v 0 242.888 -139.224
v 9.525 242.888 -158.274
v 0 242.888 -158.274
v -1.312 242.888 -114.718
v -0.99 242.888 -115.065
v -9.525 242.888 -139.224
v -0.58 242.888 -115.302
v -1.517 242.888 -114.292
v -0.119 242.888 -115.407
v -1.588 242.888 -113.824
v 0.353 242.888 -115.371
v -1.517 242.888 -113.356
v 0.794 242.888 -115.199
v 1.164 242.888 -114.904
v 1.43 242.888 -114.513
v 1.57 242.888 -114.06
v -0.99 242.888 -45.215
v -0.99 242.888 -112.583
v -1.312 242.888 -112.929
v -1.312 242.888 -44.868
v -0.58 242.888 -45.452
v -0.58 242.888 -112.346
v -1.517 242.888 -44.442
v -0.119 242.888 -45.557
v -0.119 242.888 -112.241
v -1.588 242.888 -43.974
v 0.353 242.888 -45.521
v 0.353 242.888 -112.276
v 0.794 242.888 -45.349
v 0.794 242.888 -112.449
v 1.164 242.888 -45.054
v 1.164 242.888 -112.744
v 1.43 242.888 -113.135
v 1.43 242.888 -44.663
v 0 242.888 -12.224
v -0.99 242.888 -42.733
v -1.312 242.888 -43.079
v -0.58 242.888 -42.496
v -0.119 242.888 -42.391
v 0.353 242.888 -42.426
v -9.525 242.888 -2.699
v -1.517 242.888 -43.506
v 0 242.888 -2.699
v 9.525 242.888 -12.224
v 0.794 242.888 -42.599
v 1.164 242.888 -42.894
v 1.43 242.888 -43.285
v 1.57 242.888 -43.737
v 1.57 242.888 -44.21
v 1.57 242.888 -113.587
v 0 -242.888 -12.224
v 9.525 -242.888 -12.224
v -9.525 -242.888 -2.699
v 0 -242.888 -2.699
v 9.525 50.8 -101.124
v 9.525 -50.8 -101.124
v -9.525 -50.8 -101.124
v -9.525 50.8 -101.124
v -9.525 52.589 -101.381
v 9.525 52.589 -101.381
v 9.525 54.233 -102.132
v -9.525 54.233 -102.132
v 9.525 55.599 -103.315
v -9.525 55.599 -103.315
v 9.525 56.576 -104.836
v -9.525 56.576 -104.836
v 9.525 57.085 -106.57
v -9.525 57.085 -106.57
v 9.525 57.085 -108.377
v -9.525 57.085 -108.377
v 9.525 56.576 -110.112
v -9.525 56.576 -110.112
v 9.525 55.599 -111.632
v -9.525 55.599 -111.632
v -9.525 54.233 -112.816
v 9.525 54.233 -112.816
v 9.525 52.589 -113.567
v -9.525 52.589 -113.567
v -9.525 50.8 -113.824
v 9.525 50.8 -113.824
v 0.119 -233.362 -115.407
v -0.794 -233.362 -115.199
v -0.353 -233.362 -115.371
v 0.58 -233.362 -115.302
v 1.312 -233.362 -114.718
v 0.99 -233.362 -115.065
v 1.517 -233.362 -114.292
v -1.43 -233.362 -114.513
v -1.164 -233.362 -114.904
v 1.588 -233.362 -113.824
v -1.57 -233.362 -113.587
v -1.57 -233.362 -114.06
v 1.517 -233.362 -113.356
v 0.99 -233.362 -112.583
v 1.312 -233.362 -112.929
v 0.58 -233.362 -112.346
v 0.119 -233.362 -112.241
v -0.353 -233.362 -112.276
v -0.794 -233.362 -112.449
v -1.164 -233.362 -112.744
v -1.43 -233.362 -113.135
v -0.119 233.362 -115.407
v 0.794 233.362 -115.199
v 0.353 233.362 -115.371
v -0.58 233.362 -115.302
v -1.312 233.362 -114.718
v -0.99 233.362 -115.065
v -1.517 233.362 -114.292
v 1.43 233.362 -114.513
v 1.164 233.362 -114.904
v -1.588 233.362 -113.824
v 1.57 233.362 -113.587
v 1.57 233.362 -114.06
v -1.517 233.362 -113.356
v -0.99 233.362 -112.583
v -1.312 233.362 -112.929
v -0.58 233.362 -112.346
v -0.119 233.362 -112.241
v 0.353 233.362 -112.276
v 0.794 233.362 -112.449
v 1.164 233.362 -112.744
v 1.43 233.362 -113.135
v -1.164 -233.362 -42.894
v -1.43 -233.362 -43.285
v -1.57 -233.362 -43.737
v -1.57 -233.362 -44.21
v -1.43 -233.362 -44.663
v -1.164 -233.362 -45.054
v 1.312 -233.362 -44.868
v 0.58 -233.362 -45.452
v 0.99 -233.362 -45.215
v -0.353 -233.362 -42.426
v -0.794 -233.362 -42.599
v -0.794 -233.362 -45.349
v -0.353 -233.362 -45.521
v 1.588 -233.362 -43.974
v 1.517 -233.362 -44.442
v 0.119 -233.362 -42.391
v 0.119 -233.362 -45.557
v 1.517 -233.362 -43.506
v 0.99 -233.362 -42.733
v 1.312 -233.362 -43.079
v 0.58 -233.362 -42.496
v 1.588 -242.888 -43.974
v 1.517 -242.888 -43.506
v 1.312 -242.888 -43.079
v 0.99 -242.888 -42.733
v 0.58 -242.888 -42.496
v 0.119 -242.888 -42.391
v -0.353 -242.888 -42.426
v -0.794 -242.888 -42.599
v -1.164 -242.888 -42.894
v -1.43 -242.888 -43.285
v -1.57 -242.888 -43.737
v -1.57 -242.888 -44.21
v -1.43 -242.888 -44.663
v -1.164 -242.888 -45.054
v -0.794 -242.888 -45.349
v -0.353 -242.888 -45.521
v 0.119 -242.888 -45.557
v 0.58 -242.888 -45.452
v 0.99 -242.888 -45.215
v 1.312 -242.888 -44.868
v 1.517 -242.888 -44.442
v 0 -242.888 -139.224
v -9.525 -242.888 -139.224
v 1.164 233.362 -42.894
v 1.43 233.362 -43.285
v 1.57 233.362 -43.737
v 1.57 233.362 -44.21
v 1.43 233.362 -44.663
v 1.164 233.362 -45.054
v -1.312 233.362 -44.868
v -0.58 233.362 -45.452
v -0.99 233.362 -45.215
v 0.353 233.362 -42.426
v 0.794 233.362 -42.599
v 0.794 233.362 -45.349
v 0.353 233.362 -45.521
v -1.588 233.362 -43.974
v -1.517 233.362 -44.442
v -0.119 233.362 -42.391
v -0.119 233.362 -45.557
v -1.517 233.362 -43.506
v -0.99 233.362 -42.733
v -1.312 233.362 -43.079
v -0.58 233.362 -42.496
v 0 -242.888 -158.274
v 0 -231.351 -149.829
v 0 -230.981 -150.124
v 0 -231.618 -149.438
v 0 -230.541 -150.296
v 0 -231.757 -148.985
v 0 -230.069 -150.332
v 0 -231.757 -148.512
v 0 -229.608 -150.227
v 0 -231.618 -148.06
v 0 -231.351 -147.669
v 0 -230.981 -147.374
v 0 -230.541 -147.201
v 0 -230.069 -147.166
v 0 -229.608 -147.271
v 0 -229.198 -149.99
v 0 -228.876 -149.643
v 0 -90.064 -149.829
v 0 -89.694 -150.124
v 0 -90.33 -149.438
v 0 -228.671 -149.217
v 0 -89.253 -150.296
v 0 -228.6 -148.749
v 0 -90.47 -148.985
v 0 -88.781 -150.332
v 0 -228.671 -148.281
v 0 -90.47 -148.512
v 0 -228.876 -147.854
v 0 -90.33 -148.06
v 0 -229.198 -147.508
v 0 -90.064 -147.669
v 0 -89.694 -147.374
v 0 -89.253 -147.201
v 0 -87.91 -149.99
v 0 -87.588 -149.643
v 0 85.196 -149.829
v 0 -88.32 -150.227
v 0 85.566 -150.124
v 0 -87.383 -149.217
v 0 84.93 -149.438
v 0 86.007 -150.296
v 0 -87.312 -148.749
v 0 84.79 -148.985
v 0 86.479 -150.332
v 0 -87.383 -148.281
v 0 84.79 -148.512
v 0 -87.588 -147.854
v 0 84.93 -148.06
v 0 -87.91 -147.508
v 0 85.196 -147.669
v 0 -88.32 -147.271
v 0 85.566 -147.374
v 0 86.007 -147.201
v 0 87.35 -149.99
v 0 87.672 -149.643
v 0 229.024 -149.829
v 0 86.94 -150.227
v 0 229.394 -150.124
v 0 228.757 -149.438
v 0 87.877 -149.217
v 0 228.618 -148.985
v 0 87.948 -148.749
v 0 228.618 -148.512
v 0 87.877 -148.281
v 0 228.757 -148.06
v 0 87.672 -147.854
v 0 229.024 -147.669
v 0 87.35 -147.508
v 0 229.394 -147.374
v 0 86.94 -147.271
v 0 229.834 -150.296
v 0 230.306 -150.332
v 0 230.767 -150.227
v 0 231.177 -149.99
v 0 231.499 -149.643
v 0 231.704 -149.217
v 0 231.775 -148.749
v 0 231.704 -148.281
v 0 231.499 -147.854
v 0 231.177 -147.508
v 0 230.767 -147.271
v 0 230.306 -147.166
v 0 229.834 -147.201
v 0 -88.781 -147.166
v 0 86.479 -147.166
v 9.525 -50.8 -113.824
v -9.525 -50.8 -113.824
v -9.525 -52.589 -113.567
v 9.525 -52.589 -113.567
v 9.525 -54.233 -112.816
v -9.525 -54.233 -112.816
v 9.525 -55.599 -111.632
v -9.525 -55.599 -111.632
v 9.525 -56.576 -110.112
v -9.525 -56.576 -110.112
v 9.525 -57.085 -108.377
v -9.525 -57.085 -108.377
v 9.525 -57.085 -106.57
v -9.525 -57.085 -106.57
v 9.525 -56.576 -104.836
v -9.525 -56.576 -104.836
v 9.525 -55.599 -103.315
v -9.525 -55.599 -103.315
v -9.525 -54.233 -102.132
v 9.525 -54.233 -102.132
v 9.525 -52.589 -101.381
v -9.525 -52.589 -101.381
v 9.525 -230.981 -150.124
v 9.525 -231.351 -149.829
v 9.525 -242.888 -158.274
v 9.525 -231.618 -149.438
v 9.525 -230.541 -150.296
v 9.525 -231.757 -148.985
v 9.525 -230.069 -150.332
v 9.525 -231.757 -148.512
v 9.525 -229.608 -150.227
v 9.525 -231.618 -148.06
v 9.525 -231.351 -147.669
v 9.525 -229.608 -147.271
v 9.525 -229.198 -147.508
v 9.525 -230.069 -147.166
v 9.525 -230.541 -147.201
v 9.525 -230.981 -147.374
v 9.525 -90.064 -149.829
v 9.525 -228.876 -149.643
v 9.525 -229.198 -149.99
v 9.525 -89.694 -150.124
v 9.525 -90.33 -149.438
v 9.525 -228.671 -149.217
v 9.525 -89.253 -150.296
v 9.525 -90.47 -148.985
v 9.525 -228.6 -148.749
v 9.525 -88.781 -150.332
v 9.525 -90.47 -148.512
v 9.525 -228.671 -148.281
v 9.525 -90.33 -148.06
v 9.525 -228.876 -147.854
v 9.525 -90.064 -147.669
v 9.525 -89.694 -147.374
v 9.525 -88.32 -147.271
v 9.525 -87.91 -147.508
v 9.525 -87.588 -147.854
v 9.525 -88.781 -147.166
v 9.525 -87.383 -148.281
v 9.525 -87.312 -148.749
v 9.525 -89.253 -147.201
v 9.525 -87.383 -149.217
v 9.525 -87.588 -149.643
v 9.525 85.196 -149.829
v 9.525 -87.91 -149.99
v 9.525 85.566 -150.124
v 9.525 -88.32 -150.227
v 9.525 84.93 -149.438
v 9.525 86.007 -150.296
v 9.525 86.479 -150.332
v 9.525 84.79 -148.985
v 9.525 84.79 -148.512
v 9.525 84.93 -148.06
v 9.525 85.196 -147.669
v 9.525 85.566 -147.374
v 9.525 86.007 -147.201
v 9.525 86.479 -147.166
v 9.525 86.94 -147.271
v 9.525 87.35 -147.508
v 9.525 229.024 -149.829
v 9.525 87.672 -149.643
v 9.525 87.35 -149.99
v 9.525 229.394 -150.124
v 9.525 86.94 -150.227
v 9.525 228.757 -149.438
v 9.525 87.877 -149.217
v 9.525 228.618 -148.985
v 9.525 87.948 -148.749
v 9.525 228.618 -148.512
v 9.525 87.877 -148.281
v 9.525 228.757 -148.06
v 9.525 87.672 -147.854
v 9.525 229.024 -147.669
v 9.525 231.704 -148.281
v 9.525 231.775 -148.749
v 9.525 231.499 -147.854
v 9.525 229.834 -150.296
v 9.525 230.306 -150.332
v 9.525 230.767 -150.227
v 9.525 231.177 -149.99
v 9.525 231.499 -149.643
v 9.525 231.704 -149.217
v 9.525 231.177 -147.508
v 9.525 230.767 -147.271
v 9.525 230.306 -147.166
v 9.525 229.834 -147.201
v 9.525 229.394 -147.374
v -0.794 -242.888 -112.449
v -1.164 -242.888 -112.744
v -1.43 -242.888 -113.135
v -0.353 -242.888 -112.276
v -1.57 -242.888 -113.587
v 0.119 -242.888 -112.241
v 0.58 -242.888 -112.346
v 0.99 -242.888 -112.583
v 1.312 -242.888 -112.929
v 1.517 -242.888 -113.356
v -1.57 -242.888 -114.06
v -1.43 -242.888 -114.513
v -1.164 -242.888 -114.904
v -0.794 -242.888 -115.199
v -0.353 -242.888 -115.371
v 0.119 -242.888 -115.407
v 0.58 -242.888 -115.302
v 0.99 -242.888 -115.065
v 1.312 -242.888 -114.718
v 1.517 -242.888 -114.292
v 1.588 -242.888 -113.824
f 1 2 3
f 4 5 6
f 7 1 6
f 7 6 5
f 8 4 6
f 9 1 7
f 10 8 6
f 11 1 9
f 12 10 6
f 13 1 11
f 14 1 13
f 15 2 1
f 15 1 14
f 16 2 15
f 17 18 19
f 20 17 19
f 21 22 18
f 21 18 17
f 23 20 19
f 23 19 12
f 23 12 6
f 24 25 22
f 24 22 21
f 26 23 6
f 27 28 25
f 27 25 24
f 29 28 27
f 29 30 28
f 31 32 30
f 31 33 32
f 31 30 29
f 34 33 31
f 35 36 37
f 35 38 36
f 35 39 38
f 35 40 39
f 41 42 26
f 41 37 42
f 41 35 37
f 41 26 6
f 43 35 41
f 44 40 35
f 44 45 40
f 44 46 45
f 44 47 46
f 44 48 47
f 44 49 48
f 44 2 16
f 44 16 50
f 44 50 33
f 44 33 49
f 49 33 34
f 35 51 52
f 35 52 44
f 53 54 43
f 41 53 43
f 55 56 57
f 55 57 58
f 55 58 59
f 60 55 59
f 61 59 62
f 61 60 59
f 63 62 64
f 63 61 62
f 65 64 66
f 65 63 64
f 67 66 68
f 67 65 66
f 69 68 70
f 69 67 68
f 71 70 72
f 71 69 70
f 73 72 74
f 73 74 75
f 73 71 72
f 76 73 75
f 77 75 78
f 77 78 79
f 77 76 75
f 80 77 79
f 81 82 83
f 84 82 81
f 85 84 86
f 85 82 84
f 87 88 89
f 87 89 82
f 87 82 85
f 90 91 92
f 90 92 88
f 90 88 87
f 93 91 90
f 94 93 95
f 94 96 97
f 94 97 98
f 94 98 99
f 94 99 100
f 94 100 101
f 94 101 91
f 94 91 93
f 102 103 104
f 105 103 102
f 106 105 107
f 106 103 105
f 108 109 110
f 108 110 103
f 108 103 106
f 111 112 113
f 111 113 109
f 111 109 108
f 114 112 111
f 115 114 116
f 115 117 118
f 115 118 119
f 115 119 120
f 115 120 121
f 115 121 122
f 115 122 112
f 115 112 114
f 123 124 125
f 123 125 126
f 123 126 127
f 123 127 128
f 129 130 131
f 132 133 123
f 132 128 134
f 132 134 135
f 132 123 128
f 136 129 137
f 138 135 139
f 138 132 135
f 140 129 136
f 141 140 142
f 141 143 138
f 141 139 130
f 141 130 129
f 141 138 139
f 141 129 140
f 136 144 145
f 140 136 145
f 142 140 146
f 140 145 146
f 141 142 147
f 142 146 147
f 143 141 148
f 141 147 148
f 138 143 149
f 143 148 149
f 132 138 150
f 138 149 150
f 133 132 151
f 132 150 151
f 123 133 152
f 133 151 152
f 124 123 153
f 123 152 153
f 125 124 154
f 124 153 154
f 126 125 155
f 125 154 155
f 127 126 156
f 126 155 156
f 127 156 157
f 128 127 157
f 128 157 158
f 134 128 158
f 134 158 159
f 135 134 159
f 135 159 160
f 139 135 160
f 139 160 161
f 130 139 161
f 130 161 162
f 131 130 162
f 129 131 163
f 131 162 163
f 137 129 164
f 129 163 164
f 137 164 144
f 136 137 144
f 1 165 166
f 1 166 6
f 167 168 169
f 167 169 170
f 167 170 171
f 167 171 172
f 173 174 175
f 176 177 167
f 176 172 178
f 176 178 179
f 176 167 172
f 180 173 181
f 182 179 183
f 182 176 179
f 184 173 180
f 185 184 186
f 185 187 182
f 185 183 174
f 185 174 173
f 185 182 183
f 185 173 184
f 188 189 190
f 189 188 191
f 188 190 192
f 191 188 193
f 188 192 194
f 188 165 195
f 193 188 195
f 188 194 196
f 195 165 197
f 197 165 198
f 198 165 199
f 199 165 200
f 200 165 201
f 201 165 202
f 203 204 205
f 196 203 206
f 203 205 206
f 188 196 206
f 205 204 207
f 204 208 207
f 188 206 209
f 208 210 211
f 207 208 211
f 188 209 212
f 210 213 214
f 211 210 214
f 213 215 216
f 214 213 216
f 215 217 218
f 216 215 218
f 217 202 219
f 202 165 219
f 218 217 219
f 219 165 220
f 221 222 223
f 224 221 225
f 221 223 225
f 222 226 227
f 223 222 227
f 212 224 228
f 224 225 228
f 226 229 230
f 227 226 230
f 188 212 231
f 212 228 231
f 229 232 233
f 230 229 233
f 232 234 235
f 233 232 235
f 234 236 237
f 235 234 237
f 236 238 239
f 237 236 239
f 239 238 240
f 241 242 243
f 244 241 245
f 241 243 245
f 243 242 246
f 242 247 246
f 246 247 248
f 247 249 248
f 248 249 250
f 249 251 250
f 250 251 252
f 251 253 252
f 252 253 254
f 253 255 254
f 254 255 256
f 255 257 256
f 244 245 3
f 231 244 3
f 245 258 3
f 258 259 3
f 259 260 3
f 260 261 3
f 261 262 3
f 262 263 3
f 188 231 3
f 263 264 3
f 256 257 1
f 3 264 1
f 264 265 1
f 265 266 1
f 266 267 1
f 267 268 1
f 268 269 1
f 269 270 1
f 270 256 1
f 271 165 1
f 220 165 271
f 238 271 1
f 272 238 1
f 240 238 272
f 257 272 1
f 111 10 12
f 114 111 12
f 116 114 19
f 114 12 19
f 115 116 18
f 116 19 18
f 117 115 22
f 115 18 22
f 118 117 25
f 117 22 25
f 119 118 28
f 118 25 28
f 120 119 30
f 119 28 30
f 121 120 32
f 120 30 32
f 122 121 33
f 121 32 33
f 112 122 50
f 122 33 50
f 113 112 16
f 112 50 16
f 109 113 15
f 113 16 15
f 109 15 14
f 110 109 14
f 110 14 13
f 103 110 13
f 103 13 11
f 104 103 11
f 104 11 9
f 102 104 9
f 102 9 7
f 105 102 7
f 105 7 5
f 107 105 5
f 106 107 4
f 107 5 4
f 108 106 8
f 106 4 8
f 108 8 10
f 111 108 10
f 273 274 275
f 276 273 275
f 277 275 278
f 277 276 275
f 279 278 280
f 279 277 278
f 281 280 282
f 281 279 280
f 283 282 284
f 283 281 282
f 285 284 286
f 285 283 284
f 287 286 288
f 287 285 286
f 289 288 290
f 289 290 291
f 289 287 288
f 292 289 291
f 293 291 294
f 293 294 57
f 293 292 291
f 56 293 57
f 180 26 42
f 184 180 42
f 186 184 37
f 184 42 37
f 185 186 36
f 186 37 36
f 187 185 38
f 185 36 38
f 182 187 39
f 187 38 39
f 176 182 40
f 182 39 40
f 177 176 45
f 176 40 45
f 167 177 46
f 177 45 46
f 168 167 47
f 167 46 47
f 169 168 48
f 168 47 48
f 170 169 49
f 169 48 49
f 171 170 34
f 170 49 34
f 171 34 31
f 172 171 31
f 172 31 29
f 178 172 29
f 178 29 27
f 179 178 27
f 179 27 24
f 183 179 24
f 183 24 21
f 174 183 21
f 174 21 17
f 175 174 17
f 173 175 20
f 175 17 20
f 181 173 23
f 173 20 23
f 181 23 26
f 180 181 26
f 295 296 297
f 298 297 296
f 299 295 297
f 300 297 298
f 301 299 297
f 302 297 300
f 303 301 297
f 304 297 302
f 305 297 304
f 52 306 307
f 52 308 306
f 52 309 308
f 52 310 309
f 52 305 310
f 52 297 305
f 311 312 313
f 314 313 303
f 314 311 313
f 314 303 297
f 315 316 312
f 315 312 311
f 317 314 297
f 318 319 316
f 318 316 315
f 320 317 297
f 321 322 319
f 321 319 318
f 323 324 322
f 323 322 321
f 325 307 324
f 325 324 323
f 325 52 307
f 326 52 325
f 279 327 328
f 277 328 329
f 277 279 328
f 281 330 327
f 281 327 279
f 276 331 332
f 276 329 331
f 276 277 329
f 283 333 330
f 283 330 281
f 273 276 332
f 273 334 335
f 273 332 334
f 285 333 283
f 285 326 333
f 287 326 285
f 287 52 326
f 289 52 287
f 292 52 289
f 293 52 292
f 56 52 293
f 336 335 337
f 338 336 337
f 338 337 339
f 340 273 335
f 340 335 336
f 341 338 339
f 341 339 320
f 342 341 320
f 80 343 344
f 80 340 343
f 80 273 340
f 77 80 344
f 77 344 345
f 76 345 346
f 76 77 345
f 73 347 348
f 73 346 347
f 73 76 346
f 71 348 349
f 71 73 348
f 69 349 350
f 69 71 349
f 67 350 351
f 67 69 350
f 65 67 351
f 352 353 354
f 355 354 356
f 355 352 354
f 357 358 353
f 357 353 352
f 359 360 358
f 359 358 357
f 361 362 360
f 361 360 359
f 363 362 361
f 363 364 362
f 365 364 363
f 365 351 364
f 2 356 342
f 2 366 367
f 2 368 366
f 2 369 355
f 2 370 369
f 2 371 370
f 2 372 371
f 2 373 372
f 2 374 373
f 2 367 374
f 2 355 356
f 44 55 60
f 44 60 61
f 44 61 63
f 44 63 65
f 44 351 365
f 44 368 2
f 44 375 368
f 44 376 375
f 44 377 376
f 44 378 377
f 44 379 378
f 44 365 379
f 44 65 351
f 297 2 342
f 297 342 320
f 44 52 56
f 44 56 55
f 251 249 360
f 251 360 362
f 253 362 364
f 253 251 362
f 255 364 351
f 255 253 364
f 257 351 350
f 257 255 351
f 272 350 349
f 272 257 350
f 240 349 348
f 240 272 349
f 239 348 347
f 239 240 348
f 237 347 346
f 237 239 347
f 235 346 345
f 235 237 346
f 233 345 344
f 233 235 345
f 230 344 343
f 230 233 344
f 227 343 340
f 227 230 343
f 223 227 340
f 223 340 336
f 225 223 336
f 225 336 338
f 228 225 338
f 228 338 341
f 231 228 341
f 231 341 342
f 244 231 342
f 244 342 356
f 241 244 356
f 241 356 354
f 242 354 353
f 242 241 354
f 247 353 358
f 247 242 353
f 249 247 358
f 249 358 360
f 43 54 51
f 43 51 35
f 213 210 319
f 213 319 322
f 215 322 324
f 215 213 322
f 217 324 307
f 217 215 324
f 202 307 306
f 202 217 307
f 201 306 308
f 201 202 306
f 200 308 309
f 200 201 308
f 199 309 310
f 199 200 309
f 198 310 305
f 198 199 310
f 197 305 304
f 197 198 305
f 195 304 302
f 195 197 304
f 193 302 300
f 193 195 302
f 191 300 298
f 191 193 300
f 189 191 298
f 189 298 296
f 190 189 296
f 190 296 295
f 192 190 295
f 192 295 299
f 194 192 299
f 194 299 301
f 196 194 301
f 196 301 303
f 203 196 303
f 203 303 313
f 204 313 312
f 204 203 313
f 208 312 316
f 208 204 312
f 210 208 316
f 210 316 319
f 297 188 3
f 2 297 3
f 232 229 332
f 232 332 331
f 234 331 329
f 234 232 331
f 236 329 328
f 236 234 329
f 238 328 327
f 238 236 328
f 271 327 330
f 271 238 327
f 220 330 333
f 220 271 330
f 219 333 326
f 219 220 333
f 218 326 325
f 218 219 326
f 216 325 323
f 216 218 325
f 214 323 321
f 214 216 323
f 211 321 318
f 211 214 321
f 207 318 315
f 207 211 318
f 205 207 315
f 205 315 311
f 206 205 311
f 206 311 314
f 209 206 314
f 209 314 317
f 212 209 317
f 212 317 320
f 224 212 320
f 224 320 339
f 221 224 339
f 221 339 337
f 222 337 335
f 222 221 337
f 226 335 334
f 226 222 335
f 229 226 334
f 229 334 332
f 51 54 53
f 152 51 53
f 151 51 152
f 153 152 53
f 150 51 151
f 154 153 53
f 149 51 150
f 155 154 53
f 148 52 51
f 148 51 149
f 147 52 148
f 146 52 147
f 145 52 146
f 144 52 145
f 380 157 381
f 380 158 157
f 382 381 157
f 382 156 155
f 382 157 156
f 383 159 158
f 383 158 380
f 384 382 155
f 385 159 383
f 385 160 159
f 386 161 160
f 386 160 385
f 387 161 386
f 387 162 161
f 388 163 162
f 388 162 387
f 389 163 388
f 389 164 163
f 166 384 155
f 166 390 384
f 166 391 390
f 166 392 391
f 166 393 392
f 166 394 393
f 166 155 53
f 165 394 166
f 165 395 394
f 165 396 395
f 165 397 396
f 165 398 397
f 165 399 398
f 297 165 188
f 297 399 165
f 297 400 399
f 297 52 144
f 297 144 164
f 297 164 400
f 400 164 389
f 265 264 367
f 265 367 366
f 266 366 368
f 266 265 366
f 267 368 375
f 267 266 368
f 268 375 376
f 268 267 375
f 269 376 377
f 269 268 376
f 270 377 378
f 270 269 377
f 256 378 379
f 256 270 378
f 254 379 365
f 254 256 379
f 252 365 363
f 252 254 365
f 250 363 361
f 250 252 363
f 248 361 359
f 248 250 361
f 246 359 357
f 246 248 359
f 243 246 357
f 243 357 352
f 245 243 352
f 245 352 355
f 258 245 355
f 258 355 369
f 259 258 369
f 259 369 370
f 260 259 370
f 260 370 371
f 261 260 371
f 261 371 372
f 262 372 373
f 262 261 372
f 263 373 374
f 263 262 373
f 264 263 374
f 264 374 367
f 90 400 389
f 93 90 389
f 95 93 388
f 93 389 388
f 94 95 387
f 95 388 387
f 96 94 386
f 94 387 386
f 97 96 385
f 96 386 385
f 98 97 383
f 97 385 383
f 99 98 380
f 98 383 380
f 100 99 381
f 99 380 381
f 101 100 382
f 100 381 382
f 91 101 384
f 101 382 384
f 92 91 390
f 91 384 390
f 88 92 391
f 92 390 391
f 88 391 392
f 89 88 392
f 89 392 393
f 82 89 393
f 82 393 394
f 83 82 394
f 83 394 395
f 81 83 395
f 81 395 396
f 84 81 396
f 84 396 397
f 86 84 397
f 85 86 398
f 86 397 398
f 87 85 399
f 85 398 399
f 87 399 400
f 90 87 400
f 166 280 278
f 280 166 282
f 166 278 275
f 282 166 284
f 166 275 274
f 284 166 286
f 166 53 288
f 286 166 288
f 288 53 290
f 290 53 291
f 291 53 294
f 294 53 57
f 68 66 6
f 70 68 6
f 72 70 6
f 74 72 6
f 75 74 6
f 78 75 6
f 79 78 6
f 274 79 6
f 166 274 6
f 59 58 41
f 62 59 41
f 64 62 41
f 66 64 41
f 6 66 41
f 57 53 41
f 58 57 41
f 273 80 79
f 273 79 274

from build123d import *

# Parameters (mm, degrees)
F0_W     = 485.775
F0_H     = 19.05
F0_R     = 1.5875
F0_H_2   = 127
F1_DEPTH = 9.525
F0_H_3   = 9.525
F2_DEPTH = 9.525
F4_R     = 1.5875
F5_DEPTH = 9.525
F3_R     = 1.5875
F6_DEPTH = 9.525


with BuildPart() as f1:
    # F0 (on Right) → F1 (new body)
    with BuildSketch(Plane.YZ):
        with Locations((0, -148.74875)):
            Rectangle(F0_W, F0_H)
        with Locations((-230.1875, -148.74875)):
            Circle(F0_R, mode=Mode.SUBTRACT)
        with Locations((-88.9, -148.74875)):
            Circle(F0_R, mode=Mode.SUBTRACT)
        with Locations((86.36, -148.74875)):
            Circle(F0_R, mode=Mode.SUBTRACT)
        with Locations((230.1875, -148.74875)):
            Circle(F0_R, mode=Mode.SUBTRACT)
        with Locations((0, -75.72375)):
            Rectangle(F0_W, F0_H_2)
        with BuildLine():
            Line((-50.8, -101.12375), (50.8, -101.12375))
            ThreePointArc((50.8, -101.12375), (57.15, -107.47375), (50.8, -113.82375))
            Line((50.8, -113.82375), (-50.8, -113.82375))
            ThreePointArc((-50.8, -113.82375), (-57.15, -107.47375), (-50.8, -101.12375))
        make_face(mode=Mode.SUBTRACT)
    extrude(amount=F1_DEPTH)

    # F0 (on Right) → F2 (join)
    with BuildSketch(Plane.YZ):
        with Locations((0, -75.72375)):
            Rectangle(F0_W, F0_H_2)
        with BuildLine():
            Line((-50.8, -101.12375), (50.8, -101.12375))
            ThreePointArc((50.8, -101.12375), (57.15, -107.47375), (50.8, -113.82375))
            Line((50.8, -113.82375), (-50.8, -113.82375))
            ThreePointArc((-50.8, -113.82375), (-57.15, -107.47375), (-50.8, -101.12375))
        make_face(mode=Mode.SUBTRACT)
        with Locations((0, -7.46125)):
            Rectangle(F0_W, F0_H_3)
    extrude(amount=-F2_DEPTH)

    # F4 (on face) → F5 (cut)
    with BuildSketch(Plane(origin=(0, 242.8875, 0), x_dir=(-1, 0, 0), z_dir=(0, 1, 0))):
        with Locations((0, -43.97375)):
            Circle(F4_R)
        with Locations((0, -113.82375)):
            Circle(F4_R)
    extrude(amount=-F5_DEPTH, mode=Mode.SUBTRACT)

    # F3 (on face) → F6 (cut)
    with BuildSketch(Plane.XZ.offset(242.8875)):
        with Locations((0, -113.82375)):
            Circle(F3_R)
        with Locations((0, -43.97375)):
            Circle(F3_R)
    extrude(amount=-F6_DEPTH, mode=Mode.SUBTRACT)


solid = f1.part
